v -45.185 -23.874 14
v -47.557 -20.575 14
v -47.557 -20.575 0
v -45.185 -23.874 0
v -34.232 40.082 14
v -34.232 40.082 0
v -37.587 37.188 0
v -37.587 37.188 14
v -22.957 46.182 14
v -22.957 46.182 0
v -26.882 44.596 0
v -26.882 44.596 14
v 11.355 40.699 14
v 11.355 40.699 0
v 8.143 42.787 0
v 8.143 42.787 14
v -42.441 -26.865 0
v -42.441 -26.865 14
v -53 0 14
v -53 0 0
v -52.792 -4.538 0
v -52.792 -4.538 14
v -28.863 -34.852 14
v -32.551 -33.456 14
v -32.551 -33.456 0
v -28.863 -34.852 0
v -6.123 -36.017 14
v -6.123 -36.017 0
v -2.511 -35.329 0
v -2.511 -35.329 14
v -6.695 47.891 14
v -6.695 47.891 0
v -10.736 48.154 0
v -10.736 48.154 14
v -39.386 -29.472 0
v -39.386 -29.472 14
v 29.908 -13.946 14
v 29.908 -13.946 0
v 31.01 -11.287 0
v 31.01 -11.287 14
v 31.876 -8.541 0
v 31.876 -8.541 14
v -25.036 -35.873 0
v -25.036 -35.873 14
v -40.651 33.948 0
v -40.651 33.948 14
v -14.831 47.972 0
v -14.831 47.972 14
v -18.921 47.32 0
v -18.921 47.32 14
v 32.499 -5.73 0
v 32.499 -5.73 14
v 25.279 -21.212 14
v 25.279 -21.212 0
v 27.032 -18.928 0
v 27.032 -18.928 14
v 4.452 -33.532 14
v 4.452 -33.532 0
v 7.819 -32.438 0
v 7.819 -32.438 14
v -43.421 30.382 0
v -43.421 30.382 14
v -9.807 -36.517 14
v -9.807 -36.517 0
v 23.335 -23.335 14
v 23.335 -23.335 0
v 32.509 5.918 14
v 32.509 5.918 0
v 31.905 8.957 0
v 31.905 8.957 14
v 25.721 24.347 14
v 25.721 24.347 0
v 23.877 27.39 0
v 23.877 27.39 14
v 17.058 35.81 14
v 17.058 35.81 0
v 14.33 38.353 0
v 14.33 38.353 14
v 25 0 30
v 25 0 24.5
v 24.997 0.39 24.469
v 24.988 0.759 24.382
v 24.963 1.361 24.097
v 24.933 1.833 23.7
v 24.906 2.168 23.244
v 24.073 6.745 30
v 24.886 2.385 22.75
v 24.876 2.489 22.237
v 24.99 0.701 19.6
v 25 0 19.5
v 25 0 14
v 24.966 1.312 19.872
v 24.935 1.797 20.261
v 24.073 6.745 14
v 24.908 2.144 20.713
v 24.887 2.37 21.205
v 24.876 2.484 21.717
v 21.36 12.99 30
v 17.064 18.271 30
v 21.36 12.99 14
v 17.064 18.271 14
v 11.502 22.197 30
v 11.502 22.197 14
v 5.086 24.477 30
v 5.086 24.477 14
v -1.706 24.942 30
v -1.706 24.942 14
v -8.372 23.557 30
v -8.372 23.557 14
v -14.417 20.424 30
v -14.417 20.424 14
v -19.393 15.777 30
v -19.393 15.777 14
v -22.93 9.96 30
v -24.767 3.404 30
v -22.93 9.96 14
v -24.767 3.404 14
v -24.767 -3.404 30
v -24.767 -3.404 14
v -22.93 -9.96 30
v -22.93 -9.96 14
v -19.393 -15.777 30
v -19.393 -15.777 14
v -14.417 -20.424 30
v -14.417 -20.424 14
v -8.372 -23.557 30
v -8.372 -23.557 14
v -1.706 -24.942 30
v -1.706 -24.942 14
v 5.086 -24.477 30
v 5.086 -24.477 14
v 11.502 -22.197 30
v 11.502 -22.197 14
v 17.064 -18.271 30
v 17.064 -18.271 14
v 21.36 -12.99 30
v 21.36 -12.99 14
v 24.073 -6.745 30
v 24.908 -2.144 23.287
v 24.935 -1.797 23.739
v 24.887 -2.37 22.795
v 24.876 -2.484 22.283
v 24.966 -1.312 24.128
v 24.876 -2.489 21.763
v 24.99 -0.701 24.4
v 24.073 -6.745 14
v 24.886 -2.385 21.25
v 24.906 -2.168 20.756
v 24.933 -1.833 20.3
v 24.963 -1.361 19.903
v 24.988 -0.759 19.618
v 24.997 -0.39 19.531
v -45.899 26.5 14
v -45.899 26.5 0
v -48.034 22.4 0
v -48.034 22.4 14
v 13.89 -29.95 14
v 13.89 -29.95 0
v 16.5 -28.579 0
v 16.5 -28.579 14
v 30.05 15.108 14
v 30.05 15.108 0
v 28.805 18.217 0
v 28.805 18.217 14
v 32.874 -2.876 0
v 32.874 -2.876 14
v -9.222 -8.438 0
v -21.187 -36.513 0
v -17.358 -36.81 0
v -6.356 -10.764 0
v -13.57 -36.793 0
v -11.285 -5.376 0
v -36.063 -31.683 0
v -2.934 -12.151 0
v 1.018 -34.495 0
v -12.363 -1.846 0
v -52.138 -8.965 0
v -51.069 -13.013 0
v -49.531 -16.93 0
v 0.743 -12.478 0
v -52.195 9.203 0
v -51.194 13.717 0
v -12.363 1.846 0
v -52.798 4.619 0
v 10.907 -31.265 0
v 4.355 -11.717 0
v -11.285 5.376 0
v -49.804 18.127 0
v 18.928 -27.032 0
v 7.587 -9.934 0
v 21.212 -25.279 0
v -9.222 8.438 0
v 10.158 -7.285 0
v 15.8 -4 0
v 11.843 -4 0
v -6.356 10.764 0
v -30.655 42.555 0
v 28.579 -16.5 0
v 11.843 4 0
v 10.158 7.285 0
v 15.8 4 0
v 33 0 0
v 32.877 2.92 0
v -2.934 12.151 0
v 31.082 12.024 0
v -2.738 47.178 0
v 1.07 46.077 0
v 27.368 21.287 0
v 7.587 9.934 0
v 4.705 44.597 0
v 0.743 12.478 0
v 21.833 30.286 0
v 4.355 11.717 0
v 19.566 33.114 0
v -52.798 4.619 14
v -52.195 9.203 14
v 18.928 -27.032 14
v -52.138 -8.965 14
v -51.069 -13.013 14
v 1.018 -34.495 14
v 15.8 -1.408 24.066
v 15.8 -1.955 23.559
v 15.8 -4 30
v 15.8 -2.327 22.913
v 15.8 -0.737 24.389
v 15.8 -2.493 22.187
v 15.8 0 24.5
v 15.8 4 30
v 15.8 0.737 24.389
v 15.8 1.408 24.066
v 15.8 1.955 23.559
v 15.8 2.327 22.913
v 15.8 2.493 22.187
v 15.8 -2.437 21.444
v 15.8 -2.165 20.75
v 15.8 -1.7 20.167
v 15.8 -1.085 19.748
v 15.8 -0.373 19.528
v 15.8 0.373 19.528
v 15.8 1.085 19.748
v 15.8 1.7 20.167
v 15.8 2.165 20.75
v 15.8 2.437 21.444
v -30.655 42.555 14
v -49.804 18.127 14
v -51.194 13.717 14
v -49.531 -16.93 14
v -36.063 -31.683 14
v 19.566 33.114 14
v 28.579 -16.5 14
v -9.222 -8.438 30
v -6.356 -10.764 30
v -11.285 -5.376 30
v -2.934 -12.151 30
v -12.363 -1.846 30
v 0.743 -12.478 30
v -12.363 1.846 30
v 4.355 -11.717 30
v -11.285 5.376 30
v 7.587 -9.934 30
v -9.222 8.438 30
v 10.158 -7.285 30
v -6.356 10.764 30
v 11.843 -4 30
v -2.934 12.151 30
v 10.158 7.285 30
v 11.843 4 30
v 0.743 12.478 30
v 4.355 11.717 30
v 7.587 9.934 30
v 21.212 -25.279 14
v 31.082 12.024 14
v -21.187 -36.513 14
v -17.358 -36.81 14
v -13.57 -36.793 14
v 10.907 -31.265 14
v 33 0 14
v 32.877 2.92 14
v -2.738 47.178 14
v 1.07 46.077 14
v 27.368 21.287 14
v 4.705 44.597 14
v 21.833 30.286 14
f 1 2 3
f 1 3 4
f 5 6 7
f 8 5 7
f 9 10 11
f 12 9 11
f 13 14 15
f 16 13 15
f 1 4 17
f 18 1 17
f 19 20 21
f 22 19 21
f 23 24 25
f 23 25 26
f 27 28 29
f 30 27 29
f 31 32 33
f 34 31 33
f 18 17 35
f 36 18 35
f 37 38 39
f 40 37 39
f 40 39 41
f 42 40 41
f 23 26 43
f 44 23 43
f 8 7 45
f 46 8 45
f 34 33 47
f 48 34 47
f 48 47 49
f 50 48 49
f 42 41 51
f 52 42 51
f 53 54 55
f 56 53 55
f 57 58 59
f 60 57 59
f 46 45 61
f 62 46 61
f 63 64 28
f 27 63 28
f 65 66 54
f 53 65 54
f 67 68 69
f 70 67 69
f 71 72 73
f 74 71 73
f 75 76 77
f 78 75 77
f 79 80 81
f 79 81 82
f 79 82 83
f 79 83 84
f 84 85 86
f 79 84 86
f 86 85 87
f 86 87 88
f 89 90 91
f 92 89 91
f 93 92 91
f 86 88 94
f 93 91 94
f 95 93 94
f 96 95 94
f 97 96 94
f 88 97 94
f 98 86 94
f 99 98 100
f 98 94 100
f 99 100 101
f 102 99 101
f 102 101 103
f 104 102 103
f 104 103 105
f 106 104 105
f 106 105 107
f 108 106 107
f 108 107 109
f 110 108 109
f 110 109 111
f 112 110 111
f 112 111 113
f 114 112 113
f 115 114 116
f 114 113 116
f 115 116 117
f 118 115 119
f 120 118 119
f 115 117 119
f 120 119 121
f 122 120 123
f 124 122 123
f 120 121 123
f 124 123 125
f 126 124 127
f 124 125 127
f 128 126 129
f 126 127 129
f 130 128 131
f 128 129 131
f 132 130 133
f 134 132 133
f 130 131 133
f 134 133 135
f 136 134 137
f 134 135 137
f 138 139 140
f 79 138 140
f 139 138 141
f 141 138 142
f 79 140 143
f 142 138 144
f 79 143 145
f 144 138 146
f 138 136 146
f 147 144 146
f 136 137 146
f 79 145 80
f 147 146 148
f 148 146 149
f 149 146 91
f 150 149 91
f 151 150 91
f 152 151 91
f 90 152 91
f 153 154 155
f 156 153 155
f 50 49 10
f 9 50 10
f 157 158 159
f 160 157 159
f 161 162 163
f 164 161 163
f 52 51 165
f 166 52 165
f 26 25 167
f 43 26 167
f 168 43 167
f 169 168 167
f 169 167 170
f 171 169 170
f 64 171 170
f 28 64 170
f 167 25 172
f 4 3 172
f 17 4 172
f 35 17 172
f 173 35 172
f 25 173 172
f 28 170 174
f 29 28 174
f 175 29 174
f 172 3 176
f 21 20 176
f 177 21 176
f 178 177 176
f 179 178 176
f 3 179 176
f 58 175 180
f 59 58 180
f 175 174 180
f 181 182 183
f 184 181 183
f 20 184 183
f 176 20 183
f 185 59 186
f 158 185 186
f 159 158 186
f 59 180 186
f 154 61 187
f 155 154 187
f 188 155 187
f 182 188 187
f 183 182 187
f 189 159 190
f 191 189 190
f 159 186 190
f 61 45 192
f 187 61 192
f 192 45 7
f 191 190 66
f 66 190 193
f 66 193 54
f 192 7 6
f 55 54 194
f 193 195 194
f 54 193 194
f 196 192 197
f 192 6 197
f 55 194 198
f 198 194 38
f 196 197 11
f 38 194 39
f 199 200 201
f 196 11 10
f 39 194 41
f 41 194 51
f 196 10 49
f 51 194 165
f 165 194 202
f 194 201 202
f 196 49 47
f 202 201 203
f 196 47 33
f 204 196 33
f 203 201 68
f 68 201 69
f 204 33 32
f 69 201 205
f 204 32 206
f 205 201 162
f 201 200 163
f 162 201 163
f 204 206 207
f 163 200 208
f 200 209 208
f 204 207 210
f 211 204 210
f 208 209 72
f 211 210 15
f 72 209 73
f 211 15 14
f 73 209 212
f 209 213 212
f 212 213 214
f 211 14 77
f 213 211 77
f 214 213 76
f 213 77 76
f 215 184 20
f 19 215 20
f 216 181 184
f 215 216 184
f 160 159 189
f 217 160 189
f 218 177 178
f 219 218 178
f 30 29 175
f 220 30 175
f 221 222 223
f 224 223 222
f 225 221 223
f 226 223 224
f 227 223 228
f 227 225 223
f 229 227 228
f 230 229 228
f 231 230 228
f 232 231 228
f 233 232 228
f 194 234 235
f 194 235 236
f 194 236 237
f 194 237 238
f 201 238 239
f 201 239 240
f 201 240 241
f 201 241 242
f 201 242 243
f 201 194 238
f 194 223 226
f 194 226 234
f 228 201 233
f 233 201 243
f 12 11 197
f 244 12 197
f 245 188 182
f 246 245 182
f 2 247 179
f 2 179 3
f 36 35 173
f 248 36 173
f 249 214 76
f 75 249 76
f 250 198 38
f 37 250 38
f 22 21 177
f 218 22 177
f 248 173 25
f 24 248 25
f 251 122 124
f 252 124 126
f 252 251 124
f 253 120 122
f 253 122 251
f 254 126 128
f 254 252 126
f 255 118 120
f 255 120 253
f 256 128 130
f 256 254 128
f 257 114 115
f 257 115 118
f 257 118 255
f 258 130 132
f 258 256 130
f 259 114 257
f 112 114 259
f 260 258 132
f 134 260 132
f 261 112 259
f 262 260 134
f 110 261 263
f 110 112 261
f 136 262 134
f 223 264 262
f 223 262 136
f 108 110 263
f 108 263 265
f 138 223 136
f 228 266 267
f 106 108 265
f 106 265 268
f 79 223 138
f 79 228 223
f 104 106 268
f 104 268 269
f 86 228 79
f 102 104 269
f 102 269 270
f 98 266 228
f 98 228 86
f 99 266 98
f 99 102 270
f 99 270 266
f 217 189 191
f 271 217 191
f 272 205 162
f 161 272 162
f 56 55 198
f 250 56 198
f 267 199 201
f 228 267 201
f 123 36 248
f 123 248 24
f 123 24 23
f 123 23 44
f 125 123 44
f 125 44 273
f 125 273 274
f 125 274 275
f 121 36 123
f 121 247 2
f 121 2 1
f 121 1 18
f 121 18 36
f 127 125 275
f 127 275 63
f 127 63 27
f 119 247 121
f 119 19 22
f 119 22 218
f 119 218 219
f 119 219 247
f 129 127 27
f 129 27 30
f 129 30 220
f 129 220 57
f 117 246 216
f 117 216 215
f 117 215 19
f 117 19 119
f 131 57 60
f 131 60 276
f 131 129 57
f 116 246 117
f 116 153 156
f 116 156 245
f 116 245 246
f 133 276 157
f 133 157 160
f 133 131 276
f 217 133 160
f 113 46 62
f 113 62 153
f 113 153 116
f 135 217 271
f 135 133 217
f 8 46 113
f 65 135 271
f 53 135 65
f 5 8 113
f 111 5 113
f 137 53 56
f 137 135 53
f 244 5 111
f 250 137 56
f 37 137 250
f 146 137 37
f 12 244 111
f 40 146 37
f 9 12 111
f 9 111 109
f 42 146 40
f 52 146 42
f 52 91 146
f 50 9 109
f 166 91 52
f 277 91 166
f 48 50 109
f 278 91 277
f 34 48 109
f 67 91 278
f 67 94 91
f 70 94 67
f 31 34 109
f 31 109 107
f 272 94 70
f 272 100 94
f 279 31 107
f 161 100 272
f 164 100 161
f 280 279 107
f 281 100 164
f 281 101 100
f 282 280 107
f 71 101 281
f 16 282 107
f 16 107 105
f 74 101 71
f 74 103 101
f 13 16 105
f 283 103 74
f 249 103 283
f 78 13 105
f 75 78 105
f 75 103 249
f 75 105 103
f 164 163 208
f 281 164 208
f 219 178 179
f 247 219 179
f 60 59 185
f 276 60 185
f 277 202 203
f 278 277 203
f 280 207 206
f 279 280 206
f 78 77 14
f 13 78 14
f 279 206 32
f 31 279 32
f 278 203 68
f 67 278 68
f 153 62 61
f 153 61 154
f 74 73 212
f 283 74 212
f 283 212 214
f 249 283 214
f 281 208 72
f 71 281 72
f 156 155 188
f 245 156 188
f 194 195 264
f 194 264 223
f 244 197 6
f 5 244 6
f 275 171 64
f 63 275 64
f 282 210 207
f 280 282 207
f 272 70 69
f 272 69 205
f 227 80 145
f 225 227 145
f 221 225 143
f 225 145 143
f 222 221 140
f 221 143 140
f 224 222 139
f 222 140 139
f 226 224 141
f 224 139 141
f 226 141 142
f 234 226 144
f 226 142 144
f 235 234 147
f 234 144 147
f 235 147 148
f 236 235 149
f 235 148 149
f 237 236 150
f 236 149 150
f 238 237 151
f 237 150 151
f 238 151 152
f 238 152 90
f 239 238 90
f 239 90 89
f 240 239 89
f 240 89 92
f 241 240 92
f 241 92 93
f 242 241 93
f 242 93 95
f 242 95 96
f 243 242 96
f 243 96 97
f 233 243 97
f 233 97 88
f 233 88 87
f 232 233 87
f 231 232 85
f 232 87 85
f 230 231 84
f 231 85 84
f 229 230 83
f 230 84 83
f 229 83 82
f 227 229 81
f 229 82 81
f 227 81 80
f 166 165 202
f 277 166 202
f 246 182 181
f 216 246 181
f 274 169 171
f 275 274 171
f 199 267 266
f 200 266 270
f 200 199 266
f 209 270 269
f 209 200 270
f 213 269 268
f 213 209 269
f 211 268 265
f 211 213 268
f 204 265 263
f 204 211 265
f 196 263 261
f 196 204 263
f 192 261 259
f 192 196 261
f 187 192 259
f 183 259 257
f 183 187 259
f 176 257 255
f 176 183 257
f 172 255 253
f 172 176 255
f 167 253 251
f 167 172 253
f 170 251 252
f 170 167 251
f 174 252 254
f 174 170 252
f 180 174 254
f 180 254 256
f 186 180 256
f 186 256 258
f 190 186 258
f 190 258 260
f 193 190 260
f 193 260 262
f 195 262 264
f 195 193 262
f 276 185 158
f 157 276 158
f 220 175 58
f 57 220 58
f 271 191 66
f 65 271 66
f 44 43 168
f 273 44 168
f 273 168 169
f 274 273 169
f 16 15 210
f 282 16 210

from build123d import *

# Parameters (mm, degrees)
EXTRUDE_1_DEPTH     = 14
SKETCH_2_R          = 25
EXTRUDE_2_DEPTH     = 30
SKETCH_3_R          = 12.5
CUT_EXTRUDE_1_DEPTH = 78.638957463
SKETCH_4_W          = 15.8
SKETCH_4_H          = 8
CUT_EXTRUDE_2_DEPTH = 78.638957463
SKETCH_5_R          = 2.5
CUT_EXTRUDE_3_DEPTH = 12.6


with BuildPart() as part:
    # 草图1 → 凸台-拉伸1 (new body)
    with BuildSketch(Plane.XY):
        Polygon((33, 0), (32.877, 2.92), (32.509, 5.918), (31.905, 8.957), (31.082, 12.024), (30.05, 15.108), (28.805, 18.217), (27.368, 21.287), (25.721, 24.347), (23.877, 27.39), (21.833, 30.286), (19.566, 33.114), (17.058, 35.81), (14.33, 38.353), (11.355, 40.699), (8.143, 42.787), (4.705, 44.597), (1.07, 46.077), (-2.738, 47.178), (-6.695, 47.891), (-10.736, 48.154), (-14.831, 47.972), (-18.921, 47.32), (-22.957, 46.182), (-26.882, 44.596), (-30.655, 42.555), (-34.232, 40.082), (-37.587, 37.188), (-40.651, 33.948), (-43.421, 30.382), (-45.899, 26.5), (-48.034, 22.4), (-49.804, 18.127), (-51.194, 13.717), (-52.195, 9.203), (-52.798, 4.619), (-53, 0), (-52.792, -4.538), (-52.138, -8.965), (-51.069, -13.013), (-49.531, -16.93), (-47.557, -20.575), (-45.185, -23.874), (-42.441, -26.865), (-39.386, -29.472), (-36.063, -31.683), (-32.551, -33.456), (-28.863, -34.852), (-25.036, -35.873), (-21.187, -36.513), (-17.358, -36.81), (-13.57, -36.793), (-9.807, -36.517), (-6.123, -36.017), (-2.511, -35.329), (1.018, -34.495), (4.452, -33.532), (7.819, -32.438), (10.907, -31.265), (13.89, -29.95), (16.5, -28.579), (18.928, -27.032), (21.212, -25.279), (23.335, -23.335), (25.279, -21.212), (27.032, -18.928), (28.579, -16.5), (29.908, -13.946), (31.01, -11.287), (31.876, -8.541), (32.499, -5.73), (32.874, -2.876), align=None)
    extrude(amount=EXTRUDE_1_DEPTH)

    # 草图2 → 凸台-拉伸2 (add)
    with BuildSketch(Plane.XY):
        Circle(SKETCH_2_R)
    extrude(amount=EXTRUDE_2_DEPTH)

    # 草图3 → 切除-拉伸1 (cut, through all)
    with BuildSketch(Plane.XY):
        Circle(SKETCH_3_R)
    extrude(amount=CUT_EXTRUDE_1_DEPTH, mode=Mode.SUBTRACT)

    # 草图4 → 切除-拉伸2 (cut, through all)
    with BuildSketch(Plane.XY):
        with Locations((7.9, 0)):
            Rectangle(SKETCH_4_W, SKETCH_4_H)
    extrude(amount=CUT_EXTRUDE_2_DEPTH, mode=Mode.SUBTRACT)

    # 草图5 → 切除-拉伸3 (cut)
    with BuildSketch(Plane(origin=(25, 0, 0), x_dir=(0, 0, -1), z_dir=(1, 0, 0))):
        with Locations(Location((-22, 0, 0), (0, 0, 180))):
            Circle(SKETCH_5_R)
    extrude(amount=-CUT_EXTRUDE_3_DEPTH, mode=Mode.SUBTRACT)


solid = part.part
